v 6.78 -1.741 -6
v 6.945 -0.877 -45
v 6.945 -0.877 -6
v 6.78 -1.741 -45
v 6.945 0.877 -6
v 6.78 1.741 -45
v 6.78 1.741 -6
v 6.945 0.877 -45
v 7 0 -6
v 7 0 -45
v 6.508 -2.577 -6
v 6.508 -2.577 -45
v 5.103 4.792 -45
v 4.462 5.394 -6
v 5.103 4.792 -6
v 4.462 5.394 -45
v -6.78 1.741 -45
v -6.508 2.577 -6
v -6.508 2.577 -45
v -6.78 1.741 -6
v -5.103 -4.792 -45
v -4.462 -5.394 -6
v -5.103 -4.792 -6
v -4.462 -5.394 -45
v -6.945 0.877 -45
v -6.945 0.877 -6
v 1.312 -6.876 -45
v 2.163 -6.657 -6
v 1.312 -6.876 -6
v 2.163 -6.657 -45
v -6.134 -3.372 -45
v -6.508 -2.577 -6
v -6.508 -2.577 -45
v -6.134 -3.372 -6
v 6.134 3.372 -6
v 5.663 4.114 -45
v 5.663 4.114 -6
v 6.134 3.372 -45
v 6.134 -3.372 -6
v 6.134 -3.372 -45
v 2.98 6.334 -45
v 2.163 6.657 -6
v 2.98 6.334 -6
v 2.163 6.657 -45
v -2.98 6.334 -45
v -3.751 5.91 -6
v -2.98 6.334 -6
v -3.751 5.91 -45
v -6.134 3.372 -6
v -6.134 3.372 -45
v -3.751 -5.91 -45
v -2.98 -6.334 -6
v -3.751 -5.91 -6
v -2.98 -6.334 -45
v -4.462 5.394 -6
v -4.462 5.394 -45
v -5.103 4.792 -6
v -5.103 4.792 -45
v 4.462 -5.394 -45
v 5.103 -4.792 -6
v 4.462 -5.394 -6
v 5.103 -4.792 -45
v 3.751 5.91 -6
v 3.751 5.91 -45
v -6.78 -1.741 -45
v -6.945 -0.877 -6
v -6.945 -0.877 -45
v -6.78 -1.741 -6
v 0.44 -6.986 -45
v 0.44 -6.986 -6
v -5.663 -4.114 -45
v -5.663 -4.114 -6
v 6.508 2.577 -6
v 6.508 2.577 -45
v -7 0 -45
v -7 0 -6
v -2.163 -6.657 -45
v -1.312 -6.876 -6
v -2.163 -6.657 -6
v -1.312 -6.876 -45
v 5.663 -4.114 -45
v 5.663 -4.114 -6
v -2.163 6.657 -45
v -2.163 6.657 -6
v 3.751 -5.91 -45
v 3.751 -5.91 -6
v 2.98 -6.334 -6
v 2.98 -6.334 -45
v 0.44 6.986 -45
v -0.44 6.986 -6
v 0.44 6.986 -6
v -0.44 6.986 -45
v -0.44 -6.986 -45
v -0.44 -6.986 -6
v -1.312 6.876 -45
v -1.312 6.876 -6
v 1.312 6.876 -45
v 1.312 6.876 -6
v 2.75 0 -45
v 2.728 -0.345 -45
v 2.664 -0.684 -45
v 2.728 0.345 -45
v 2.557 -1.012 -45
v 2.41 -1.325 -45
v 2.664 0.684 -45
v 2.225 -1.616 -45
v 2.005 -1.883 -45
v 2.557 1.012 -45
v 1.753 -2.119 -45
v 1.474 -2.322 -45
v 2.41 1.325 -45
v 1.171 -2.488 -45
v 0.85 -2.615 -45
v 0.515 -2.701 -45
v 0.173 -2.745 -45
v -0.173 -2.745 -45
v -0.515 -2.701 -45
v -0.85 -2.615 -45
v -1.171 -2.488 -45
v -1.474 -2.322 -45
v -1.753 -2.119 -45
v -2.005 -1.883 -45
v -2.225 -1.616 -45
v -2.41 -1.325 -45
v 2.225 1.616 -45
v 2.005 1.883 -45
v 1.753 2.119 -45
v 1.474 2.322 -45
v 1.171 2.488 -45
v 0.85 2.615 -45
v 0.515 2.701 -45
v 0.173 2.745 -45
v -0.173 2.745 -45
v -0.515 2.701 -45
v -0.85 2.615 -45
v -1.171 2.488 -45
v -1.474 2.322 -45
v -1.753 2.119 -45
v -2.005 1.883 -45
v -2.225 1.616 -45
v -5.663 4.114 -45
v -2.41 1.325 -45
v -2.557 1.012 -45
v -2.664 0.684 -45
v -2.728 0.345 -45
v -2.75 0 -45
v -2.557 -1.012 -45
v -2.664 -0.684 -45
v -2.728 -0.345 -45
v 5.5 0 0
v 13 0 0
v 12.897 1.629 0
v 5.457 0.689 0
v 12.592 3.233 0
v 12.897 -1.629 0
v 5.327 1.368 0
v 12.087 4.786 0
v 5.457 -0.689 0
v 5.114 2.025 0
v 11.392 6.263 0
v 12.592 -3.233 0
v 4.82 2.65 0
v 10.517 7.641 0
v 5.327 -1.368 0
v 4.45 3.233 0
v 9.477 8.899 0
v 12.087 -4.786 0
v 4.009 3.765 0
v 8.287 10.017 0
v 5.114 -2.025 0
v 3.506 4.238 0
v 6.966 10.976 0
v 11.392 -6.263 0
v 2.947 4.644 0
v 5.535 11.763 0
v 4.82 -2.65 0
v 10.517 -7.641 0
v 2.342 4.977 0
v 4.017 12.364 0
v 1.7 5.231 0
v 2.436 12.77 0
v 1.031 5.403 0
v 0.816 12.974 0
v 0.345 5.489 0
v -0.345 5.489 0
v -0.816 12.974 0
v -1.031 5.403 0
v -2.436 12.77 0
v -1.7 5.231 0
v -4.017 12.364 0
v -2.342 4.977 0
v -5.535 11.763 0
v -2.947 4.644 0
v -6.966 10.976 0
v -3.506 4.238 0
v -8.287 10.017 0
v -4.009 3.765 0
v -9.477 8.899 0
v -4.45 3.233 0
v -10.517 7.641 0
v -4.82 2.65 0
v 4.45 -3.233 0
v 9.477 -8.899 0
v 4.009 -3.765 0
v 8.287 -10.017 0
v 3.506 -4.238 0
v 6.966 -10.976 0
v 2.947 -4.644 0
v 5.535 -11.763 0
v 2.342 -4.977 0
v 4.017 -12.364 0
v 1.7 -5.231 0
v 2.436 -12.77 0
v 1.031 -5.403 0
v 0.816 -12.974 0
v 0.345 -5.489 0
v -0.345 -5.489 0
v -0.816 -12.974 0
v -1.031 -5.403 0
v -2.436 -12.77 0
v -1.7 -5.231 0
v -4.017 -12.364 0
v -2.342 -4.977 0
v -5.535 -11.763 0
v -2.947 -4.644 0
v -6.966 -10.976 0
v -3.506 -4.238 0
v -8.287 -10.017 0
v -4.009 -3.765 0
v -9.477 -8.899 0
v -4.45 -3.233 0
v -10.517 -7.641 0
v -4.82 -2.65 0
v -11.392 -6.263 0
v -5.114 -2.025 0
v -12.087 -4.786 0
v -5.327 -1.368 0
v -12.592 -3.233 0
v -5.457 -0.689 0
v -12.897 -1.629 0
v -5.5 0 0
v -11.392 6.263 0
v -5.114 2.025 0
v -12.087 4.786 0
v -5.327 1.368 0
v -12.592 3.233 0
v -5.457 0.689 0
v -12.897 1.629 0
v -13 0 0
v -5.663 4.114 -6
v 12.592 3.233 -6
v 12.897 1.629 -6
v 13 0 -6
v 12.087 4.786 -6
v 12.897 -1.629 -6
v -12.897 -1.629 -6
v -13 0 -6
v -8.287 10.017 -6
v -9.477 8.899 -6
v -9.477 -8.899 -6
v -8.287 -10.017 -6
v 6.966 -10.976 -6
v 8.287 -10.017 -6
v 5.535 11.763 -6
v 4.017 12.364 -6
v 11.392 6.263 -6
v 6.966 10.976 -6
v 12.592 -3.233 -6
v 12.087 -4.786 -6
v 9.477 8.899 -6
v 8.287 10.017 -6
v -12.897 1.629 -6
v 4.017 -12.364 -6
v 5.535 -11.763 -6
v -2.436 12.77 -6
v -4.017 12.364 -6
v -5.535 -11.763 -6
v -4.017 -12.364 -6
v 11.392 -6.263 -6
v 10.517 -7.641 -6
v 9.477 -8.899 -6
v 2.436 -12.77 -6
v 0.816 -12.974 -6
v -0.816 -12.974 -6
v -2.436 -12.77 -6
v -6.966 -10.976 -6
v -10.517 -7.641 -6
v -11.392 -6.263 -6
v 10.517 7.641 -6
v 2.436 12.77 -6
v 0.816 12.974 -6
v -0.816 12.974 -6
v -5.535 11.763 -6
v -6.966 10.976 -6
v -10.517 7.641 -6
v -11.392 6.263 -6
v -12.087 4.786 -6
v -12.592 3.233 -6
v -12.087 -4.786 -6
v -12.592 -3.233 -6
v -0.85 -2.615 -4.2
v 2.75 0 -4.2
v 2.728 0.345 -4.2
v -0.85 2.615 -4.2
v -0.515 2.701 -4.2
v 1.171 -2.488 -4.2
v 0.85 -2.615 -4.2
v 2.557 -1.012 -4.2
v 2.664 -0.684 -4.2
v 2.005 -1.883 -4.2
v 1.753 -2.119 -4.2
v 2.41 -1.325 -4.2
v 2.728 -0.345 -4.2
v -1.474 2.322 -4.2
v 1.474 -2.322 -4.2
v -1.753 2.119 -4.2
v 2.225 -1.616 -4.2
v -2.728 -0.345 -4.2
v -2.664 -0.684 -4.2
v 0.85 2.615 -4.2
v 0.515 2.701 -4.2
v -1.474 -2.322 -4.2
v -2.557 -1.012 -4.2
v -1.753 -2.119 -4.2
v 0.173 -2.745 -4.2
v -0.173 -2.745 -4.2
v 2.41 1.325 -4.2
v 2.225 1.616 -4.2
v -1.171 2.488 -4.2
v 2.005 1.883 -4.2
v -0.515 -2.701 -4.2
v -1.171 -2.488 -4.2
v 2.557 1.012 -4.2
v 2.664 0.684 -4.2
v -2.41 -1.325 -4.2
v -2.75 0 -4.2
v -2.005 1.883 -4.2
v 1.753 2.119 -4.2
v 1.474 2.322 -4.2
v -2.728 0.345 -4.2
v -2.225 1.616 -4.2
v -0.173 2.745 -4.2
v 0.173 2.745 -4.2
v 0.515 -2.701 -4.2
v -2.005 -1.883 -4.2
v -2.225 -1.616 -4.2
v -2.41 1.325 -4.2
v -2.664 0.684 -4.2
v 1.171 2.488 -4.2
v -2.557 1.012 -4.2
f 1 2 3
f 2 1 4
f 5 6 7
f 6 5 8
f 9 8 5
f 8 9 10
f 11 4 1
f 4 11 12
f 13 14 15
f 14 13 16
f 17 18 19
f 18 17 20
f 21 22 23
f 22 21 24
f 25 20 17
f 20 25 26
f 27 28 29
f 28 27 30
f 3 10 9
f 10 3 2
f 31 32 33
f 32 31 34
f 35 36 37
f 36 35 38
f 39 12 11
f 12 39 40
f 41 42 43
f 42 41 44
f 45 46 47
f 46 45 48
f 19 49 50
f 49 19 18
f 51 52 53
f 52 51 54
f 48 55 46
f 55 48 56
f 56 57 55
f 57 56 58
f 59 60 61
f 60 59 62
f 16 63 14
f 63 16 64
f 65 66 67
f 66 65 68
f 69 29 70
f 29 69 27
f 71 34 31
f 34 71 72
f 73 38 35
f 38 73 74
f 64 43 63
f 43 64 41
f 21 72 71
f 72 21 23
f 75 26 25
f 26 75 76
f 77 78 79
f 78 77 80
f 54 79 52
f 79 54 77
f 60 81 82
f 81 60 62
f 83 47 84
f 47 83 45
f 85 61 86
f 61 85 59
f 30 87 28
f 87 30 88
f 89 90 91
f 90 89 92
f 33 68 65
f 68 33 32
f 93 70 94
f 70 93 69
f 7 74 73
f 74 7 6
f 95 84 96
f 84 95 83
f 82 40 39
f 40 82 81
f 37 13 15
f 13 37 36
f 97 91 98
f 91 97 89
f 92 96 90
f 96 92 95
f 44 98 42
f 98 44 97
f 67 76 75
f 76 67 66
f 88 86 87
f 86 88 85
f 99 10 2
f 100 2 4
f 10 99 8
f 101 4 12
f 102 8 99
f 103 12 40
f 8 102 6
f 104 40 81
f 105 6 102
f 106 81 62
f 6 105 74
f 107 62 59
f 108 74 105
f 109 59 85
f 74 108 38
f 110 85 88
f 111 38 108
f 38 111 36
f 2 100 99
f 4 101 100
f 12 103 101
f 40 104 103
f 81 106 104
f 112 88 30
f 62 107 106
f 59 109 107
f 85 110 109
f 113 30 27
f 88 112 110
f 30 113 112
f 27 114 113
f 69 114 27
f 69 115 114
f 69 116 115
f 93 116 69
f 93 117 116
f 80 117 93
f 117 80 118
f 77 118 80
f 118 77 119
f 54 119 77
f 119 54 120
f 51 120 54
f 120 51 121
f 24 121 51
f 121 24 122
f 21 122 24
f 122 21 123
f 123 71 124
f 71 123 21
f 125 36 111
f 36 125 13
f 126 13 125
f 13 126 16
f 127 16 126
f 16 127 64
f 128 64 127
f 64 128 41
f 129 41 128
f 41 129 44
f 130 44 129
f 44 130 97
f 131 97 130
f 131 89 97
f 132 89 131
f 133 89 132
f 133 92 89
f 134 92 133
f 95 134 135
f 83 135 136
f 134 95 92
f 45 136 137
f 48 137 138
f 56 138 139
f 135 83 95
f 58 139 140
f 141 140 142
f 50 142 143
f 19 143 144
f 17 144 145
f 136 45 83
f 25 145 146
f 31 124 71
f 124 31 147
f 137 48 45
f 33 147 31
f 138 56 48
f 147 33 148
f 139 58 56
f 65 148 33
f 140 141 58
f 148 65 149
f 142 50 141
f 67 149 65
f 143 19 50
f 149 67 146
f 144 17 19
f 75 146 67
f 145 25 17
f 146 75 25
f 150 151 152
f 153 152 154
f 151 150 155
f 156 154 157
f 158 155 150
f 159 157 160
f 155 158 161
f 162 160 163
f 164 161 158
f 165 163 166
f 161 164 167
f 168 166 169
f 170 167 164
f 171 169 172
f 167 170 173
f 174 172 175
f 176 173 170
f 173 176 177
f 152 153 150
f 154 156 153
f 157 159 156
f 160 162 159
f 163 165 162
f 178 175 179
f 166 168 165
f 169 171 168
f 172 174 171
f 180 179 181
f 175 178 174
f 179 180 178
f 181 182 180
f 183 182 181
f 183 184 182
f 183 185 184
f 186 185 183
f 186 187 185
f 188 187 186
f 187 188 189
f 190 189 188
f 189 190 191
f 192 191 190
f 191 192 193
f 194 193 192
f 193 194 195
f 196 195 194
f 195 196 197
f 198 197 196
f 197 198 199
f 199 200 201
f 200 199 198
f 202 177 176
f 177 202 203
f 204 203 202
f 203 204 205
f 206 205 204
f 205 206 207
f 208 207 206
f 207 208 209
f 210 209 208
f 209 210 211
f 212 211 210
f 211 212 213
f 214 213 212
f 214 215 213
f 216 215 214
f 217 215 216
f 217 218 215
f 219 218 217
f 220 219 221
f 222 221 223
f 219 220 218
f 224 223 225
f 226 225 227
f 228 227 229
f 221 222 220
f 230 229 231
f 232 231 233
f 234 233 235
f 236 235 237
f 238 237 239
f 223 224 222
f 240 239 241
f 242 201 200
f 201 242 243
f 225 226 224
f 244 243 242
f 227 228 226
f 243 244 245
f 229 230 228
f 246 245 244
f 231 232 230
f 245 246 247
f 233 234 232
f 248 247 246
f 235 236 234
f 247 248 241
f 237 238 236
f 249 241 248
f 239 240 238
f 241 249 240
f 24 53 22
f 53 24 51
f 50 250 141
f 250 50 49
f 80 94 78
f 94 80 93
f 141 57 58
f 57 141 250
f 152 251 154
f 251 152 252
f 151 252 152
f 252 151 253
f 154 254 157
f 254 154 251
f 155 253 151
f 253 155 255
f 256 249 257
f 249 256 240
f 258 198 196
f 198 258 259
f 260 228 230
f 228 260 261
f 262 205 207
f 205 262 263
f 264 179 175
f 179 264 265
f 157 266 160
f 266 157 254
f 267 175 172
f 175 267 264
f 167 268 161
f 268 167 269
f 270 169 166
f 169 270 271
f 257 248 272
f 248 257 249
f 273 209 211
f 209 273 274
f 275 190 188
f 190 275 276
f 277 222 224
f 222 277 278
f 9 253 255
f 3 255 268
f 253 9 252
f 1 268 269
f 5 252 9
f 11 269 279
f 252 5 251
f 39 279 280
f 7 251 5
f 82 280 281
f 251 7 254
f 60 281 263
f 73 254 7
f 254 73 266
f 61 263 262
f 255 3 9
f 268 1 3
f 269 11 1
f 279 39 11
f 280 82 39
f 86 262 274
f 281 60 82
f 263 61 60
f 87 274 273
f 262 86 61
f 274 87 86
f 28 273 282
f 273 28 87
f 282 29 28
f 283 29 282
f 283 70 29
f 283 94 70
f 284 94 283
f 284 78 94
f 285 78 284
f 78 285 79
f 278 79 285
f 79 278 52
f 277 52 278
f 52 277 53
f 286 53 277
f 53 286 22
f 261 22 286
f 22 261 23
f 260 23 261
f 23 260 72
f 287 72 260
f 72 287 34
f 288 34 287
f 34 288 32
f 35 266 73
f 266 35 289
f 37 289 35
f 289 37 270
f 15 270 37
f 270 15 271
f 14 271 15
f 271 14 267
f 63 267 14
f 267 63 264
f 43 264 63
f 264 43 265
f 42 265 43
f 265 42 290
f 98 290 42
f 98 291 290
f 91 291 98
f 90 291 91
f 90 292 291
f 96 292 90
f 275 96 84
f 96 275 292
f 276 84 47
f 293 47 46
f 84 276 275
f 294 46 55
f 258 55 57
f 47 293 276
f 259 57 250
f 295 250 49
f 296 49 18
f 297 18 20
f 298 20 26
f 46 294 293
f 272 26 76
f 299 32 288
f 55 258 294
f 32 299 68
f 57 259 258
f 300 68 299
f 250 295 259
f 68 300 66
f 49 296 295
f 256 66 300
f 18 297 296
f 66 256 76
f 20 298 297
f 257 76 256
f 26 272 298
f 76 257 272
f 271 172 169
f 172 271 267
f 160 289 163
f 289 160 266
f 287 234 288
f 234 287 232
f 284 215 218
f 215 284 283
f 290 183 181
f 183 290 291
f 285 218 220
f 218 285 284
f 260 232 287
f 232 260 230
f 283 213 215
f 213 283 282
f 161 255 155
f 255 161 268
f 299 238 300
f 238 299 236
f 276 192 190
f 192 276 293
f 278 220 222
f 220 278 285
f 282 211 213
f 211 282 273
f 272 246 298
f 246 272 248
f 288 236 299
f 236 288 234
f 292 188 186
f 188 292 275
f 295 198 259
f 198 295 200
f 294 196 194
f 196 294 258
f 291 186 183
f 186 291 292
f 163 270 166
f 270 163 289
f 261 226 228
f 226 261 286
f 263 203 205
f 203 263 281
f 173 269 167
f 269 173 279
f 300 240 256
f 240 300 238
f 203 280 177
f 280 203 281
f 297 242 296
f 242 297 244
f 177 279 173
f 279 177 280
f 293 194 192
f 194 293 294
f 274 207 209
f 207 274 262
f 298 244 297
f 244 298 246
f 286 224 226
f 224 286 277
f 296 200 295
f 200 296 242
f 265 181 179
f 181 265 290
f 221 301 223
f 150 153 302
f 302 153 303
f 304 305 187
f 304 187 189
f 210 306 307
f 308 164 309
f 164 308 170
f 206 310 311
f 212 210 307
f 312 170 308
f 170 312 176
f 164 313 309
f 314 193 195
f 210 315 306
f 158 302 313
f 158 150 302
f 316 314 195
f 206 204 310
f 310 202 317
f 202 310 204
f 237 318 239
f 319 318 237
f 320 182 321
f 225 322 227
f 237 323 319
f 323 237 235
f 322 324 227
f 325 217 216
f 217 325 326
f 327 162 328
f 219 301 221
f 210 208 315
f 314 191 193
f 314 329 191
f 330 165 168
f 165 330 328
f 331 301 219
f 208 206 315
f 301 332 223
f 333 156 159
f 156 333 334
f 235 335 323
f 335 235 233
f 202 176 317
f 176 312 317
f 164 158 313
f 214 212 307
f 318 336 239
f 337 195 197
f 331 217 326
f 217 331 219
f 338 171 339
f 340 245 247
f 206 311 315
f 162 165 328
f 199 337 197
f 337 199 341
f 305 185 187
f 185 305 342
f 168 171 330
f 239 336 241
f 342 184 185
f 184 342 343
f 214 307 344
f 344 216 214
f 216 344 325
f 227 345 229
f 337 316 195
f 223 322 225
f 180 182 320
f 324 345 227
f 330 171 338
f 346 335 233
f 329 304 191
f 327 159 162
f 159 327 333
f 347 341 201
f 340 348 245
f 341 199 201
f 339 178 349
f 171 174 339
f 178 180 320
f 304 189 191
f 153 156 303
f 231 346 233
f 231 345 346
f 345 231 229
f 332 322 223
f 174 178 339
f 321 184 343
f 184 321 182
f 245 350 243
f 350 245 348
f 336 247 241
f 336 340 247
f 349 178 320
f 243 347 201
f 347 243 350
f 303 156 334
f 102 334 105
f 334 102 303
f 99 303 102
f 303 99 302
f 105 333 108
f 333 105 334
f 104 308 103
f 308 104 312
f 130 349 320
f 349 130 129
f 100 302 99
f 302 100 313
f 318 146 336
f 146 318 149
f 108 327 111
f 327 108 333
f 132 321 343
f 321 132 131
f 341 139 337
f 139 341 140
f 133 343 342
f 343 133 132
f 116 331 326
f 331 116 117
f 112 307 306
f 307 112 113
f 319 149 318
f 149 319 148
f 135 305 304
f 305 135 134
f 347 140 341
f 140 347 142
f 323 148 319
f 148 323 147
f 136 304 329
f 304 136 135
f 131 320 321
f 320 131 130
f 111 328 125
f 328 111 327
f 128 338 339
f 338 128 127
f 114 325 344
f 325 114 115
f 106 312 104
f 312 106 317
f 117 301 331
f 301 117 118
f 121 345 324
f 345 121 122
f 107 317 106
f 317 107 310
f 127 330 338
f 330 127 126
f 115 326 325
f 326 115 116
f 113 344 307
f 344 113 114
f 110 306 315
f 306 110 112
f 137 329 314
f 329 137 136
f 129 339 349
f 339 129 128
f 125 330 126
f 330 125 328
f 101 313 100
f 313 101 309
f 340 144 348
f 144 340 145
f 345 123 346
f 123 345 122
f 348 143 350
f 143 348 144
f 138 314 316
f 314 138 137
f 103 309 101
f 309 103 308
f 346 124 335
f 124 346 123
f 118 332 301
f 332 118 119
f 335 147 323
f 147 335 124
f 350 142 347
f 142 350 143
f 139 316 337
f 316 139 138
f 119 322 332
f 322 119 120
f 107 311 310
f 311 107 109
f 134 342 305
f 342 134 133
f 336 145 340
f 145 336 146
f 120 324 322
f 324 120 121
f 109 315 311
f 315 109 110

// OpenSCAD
$fn = 50;


difference() {
	union() {
		translate(v = [0, 0, -45.0000000000]) {
			cylinder(h = 45, r = 7.0000000000);
		}
		translate(v = [0, 0, -6.0000000000]) {
			cylinder(h = 6, r = 13.0000000000);
		}
	}
	union() {
		translate(v = [0, 0, 0]) {
			rotate(a = [0, 0, 0]) {
				difference() {
					union() {
						#translate(v = [0, 0, -45.0000000000]) {
							cylinder(h = 45, r = 2.2500000000);
						}
						#translate(v = [0, 0, -4.2000000000]) {
							cylinder(h = 4.2000000000, r = 7.0000000000, r1 = 2.7500000000, r2 = 5.5000000000);
						}
						#translate(v = [0, 0, -45.0000000000]) {
							cylinder(h = 45, r = 2.7500000000);
						}
						#translate(v = [0, 0, -45.0000000000]) {
							cylinder(h = 45, r = 2.2500000000);
						}
					}
					union();
				}
			}
		}
	}
}
